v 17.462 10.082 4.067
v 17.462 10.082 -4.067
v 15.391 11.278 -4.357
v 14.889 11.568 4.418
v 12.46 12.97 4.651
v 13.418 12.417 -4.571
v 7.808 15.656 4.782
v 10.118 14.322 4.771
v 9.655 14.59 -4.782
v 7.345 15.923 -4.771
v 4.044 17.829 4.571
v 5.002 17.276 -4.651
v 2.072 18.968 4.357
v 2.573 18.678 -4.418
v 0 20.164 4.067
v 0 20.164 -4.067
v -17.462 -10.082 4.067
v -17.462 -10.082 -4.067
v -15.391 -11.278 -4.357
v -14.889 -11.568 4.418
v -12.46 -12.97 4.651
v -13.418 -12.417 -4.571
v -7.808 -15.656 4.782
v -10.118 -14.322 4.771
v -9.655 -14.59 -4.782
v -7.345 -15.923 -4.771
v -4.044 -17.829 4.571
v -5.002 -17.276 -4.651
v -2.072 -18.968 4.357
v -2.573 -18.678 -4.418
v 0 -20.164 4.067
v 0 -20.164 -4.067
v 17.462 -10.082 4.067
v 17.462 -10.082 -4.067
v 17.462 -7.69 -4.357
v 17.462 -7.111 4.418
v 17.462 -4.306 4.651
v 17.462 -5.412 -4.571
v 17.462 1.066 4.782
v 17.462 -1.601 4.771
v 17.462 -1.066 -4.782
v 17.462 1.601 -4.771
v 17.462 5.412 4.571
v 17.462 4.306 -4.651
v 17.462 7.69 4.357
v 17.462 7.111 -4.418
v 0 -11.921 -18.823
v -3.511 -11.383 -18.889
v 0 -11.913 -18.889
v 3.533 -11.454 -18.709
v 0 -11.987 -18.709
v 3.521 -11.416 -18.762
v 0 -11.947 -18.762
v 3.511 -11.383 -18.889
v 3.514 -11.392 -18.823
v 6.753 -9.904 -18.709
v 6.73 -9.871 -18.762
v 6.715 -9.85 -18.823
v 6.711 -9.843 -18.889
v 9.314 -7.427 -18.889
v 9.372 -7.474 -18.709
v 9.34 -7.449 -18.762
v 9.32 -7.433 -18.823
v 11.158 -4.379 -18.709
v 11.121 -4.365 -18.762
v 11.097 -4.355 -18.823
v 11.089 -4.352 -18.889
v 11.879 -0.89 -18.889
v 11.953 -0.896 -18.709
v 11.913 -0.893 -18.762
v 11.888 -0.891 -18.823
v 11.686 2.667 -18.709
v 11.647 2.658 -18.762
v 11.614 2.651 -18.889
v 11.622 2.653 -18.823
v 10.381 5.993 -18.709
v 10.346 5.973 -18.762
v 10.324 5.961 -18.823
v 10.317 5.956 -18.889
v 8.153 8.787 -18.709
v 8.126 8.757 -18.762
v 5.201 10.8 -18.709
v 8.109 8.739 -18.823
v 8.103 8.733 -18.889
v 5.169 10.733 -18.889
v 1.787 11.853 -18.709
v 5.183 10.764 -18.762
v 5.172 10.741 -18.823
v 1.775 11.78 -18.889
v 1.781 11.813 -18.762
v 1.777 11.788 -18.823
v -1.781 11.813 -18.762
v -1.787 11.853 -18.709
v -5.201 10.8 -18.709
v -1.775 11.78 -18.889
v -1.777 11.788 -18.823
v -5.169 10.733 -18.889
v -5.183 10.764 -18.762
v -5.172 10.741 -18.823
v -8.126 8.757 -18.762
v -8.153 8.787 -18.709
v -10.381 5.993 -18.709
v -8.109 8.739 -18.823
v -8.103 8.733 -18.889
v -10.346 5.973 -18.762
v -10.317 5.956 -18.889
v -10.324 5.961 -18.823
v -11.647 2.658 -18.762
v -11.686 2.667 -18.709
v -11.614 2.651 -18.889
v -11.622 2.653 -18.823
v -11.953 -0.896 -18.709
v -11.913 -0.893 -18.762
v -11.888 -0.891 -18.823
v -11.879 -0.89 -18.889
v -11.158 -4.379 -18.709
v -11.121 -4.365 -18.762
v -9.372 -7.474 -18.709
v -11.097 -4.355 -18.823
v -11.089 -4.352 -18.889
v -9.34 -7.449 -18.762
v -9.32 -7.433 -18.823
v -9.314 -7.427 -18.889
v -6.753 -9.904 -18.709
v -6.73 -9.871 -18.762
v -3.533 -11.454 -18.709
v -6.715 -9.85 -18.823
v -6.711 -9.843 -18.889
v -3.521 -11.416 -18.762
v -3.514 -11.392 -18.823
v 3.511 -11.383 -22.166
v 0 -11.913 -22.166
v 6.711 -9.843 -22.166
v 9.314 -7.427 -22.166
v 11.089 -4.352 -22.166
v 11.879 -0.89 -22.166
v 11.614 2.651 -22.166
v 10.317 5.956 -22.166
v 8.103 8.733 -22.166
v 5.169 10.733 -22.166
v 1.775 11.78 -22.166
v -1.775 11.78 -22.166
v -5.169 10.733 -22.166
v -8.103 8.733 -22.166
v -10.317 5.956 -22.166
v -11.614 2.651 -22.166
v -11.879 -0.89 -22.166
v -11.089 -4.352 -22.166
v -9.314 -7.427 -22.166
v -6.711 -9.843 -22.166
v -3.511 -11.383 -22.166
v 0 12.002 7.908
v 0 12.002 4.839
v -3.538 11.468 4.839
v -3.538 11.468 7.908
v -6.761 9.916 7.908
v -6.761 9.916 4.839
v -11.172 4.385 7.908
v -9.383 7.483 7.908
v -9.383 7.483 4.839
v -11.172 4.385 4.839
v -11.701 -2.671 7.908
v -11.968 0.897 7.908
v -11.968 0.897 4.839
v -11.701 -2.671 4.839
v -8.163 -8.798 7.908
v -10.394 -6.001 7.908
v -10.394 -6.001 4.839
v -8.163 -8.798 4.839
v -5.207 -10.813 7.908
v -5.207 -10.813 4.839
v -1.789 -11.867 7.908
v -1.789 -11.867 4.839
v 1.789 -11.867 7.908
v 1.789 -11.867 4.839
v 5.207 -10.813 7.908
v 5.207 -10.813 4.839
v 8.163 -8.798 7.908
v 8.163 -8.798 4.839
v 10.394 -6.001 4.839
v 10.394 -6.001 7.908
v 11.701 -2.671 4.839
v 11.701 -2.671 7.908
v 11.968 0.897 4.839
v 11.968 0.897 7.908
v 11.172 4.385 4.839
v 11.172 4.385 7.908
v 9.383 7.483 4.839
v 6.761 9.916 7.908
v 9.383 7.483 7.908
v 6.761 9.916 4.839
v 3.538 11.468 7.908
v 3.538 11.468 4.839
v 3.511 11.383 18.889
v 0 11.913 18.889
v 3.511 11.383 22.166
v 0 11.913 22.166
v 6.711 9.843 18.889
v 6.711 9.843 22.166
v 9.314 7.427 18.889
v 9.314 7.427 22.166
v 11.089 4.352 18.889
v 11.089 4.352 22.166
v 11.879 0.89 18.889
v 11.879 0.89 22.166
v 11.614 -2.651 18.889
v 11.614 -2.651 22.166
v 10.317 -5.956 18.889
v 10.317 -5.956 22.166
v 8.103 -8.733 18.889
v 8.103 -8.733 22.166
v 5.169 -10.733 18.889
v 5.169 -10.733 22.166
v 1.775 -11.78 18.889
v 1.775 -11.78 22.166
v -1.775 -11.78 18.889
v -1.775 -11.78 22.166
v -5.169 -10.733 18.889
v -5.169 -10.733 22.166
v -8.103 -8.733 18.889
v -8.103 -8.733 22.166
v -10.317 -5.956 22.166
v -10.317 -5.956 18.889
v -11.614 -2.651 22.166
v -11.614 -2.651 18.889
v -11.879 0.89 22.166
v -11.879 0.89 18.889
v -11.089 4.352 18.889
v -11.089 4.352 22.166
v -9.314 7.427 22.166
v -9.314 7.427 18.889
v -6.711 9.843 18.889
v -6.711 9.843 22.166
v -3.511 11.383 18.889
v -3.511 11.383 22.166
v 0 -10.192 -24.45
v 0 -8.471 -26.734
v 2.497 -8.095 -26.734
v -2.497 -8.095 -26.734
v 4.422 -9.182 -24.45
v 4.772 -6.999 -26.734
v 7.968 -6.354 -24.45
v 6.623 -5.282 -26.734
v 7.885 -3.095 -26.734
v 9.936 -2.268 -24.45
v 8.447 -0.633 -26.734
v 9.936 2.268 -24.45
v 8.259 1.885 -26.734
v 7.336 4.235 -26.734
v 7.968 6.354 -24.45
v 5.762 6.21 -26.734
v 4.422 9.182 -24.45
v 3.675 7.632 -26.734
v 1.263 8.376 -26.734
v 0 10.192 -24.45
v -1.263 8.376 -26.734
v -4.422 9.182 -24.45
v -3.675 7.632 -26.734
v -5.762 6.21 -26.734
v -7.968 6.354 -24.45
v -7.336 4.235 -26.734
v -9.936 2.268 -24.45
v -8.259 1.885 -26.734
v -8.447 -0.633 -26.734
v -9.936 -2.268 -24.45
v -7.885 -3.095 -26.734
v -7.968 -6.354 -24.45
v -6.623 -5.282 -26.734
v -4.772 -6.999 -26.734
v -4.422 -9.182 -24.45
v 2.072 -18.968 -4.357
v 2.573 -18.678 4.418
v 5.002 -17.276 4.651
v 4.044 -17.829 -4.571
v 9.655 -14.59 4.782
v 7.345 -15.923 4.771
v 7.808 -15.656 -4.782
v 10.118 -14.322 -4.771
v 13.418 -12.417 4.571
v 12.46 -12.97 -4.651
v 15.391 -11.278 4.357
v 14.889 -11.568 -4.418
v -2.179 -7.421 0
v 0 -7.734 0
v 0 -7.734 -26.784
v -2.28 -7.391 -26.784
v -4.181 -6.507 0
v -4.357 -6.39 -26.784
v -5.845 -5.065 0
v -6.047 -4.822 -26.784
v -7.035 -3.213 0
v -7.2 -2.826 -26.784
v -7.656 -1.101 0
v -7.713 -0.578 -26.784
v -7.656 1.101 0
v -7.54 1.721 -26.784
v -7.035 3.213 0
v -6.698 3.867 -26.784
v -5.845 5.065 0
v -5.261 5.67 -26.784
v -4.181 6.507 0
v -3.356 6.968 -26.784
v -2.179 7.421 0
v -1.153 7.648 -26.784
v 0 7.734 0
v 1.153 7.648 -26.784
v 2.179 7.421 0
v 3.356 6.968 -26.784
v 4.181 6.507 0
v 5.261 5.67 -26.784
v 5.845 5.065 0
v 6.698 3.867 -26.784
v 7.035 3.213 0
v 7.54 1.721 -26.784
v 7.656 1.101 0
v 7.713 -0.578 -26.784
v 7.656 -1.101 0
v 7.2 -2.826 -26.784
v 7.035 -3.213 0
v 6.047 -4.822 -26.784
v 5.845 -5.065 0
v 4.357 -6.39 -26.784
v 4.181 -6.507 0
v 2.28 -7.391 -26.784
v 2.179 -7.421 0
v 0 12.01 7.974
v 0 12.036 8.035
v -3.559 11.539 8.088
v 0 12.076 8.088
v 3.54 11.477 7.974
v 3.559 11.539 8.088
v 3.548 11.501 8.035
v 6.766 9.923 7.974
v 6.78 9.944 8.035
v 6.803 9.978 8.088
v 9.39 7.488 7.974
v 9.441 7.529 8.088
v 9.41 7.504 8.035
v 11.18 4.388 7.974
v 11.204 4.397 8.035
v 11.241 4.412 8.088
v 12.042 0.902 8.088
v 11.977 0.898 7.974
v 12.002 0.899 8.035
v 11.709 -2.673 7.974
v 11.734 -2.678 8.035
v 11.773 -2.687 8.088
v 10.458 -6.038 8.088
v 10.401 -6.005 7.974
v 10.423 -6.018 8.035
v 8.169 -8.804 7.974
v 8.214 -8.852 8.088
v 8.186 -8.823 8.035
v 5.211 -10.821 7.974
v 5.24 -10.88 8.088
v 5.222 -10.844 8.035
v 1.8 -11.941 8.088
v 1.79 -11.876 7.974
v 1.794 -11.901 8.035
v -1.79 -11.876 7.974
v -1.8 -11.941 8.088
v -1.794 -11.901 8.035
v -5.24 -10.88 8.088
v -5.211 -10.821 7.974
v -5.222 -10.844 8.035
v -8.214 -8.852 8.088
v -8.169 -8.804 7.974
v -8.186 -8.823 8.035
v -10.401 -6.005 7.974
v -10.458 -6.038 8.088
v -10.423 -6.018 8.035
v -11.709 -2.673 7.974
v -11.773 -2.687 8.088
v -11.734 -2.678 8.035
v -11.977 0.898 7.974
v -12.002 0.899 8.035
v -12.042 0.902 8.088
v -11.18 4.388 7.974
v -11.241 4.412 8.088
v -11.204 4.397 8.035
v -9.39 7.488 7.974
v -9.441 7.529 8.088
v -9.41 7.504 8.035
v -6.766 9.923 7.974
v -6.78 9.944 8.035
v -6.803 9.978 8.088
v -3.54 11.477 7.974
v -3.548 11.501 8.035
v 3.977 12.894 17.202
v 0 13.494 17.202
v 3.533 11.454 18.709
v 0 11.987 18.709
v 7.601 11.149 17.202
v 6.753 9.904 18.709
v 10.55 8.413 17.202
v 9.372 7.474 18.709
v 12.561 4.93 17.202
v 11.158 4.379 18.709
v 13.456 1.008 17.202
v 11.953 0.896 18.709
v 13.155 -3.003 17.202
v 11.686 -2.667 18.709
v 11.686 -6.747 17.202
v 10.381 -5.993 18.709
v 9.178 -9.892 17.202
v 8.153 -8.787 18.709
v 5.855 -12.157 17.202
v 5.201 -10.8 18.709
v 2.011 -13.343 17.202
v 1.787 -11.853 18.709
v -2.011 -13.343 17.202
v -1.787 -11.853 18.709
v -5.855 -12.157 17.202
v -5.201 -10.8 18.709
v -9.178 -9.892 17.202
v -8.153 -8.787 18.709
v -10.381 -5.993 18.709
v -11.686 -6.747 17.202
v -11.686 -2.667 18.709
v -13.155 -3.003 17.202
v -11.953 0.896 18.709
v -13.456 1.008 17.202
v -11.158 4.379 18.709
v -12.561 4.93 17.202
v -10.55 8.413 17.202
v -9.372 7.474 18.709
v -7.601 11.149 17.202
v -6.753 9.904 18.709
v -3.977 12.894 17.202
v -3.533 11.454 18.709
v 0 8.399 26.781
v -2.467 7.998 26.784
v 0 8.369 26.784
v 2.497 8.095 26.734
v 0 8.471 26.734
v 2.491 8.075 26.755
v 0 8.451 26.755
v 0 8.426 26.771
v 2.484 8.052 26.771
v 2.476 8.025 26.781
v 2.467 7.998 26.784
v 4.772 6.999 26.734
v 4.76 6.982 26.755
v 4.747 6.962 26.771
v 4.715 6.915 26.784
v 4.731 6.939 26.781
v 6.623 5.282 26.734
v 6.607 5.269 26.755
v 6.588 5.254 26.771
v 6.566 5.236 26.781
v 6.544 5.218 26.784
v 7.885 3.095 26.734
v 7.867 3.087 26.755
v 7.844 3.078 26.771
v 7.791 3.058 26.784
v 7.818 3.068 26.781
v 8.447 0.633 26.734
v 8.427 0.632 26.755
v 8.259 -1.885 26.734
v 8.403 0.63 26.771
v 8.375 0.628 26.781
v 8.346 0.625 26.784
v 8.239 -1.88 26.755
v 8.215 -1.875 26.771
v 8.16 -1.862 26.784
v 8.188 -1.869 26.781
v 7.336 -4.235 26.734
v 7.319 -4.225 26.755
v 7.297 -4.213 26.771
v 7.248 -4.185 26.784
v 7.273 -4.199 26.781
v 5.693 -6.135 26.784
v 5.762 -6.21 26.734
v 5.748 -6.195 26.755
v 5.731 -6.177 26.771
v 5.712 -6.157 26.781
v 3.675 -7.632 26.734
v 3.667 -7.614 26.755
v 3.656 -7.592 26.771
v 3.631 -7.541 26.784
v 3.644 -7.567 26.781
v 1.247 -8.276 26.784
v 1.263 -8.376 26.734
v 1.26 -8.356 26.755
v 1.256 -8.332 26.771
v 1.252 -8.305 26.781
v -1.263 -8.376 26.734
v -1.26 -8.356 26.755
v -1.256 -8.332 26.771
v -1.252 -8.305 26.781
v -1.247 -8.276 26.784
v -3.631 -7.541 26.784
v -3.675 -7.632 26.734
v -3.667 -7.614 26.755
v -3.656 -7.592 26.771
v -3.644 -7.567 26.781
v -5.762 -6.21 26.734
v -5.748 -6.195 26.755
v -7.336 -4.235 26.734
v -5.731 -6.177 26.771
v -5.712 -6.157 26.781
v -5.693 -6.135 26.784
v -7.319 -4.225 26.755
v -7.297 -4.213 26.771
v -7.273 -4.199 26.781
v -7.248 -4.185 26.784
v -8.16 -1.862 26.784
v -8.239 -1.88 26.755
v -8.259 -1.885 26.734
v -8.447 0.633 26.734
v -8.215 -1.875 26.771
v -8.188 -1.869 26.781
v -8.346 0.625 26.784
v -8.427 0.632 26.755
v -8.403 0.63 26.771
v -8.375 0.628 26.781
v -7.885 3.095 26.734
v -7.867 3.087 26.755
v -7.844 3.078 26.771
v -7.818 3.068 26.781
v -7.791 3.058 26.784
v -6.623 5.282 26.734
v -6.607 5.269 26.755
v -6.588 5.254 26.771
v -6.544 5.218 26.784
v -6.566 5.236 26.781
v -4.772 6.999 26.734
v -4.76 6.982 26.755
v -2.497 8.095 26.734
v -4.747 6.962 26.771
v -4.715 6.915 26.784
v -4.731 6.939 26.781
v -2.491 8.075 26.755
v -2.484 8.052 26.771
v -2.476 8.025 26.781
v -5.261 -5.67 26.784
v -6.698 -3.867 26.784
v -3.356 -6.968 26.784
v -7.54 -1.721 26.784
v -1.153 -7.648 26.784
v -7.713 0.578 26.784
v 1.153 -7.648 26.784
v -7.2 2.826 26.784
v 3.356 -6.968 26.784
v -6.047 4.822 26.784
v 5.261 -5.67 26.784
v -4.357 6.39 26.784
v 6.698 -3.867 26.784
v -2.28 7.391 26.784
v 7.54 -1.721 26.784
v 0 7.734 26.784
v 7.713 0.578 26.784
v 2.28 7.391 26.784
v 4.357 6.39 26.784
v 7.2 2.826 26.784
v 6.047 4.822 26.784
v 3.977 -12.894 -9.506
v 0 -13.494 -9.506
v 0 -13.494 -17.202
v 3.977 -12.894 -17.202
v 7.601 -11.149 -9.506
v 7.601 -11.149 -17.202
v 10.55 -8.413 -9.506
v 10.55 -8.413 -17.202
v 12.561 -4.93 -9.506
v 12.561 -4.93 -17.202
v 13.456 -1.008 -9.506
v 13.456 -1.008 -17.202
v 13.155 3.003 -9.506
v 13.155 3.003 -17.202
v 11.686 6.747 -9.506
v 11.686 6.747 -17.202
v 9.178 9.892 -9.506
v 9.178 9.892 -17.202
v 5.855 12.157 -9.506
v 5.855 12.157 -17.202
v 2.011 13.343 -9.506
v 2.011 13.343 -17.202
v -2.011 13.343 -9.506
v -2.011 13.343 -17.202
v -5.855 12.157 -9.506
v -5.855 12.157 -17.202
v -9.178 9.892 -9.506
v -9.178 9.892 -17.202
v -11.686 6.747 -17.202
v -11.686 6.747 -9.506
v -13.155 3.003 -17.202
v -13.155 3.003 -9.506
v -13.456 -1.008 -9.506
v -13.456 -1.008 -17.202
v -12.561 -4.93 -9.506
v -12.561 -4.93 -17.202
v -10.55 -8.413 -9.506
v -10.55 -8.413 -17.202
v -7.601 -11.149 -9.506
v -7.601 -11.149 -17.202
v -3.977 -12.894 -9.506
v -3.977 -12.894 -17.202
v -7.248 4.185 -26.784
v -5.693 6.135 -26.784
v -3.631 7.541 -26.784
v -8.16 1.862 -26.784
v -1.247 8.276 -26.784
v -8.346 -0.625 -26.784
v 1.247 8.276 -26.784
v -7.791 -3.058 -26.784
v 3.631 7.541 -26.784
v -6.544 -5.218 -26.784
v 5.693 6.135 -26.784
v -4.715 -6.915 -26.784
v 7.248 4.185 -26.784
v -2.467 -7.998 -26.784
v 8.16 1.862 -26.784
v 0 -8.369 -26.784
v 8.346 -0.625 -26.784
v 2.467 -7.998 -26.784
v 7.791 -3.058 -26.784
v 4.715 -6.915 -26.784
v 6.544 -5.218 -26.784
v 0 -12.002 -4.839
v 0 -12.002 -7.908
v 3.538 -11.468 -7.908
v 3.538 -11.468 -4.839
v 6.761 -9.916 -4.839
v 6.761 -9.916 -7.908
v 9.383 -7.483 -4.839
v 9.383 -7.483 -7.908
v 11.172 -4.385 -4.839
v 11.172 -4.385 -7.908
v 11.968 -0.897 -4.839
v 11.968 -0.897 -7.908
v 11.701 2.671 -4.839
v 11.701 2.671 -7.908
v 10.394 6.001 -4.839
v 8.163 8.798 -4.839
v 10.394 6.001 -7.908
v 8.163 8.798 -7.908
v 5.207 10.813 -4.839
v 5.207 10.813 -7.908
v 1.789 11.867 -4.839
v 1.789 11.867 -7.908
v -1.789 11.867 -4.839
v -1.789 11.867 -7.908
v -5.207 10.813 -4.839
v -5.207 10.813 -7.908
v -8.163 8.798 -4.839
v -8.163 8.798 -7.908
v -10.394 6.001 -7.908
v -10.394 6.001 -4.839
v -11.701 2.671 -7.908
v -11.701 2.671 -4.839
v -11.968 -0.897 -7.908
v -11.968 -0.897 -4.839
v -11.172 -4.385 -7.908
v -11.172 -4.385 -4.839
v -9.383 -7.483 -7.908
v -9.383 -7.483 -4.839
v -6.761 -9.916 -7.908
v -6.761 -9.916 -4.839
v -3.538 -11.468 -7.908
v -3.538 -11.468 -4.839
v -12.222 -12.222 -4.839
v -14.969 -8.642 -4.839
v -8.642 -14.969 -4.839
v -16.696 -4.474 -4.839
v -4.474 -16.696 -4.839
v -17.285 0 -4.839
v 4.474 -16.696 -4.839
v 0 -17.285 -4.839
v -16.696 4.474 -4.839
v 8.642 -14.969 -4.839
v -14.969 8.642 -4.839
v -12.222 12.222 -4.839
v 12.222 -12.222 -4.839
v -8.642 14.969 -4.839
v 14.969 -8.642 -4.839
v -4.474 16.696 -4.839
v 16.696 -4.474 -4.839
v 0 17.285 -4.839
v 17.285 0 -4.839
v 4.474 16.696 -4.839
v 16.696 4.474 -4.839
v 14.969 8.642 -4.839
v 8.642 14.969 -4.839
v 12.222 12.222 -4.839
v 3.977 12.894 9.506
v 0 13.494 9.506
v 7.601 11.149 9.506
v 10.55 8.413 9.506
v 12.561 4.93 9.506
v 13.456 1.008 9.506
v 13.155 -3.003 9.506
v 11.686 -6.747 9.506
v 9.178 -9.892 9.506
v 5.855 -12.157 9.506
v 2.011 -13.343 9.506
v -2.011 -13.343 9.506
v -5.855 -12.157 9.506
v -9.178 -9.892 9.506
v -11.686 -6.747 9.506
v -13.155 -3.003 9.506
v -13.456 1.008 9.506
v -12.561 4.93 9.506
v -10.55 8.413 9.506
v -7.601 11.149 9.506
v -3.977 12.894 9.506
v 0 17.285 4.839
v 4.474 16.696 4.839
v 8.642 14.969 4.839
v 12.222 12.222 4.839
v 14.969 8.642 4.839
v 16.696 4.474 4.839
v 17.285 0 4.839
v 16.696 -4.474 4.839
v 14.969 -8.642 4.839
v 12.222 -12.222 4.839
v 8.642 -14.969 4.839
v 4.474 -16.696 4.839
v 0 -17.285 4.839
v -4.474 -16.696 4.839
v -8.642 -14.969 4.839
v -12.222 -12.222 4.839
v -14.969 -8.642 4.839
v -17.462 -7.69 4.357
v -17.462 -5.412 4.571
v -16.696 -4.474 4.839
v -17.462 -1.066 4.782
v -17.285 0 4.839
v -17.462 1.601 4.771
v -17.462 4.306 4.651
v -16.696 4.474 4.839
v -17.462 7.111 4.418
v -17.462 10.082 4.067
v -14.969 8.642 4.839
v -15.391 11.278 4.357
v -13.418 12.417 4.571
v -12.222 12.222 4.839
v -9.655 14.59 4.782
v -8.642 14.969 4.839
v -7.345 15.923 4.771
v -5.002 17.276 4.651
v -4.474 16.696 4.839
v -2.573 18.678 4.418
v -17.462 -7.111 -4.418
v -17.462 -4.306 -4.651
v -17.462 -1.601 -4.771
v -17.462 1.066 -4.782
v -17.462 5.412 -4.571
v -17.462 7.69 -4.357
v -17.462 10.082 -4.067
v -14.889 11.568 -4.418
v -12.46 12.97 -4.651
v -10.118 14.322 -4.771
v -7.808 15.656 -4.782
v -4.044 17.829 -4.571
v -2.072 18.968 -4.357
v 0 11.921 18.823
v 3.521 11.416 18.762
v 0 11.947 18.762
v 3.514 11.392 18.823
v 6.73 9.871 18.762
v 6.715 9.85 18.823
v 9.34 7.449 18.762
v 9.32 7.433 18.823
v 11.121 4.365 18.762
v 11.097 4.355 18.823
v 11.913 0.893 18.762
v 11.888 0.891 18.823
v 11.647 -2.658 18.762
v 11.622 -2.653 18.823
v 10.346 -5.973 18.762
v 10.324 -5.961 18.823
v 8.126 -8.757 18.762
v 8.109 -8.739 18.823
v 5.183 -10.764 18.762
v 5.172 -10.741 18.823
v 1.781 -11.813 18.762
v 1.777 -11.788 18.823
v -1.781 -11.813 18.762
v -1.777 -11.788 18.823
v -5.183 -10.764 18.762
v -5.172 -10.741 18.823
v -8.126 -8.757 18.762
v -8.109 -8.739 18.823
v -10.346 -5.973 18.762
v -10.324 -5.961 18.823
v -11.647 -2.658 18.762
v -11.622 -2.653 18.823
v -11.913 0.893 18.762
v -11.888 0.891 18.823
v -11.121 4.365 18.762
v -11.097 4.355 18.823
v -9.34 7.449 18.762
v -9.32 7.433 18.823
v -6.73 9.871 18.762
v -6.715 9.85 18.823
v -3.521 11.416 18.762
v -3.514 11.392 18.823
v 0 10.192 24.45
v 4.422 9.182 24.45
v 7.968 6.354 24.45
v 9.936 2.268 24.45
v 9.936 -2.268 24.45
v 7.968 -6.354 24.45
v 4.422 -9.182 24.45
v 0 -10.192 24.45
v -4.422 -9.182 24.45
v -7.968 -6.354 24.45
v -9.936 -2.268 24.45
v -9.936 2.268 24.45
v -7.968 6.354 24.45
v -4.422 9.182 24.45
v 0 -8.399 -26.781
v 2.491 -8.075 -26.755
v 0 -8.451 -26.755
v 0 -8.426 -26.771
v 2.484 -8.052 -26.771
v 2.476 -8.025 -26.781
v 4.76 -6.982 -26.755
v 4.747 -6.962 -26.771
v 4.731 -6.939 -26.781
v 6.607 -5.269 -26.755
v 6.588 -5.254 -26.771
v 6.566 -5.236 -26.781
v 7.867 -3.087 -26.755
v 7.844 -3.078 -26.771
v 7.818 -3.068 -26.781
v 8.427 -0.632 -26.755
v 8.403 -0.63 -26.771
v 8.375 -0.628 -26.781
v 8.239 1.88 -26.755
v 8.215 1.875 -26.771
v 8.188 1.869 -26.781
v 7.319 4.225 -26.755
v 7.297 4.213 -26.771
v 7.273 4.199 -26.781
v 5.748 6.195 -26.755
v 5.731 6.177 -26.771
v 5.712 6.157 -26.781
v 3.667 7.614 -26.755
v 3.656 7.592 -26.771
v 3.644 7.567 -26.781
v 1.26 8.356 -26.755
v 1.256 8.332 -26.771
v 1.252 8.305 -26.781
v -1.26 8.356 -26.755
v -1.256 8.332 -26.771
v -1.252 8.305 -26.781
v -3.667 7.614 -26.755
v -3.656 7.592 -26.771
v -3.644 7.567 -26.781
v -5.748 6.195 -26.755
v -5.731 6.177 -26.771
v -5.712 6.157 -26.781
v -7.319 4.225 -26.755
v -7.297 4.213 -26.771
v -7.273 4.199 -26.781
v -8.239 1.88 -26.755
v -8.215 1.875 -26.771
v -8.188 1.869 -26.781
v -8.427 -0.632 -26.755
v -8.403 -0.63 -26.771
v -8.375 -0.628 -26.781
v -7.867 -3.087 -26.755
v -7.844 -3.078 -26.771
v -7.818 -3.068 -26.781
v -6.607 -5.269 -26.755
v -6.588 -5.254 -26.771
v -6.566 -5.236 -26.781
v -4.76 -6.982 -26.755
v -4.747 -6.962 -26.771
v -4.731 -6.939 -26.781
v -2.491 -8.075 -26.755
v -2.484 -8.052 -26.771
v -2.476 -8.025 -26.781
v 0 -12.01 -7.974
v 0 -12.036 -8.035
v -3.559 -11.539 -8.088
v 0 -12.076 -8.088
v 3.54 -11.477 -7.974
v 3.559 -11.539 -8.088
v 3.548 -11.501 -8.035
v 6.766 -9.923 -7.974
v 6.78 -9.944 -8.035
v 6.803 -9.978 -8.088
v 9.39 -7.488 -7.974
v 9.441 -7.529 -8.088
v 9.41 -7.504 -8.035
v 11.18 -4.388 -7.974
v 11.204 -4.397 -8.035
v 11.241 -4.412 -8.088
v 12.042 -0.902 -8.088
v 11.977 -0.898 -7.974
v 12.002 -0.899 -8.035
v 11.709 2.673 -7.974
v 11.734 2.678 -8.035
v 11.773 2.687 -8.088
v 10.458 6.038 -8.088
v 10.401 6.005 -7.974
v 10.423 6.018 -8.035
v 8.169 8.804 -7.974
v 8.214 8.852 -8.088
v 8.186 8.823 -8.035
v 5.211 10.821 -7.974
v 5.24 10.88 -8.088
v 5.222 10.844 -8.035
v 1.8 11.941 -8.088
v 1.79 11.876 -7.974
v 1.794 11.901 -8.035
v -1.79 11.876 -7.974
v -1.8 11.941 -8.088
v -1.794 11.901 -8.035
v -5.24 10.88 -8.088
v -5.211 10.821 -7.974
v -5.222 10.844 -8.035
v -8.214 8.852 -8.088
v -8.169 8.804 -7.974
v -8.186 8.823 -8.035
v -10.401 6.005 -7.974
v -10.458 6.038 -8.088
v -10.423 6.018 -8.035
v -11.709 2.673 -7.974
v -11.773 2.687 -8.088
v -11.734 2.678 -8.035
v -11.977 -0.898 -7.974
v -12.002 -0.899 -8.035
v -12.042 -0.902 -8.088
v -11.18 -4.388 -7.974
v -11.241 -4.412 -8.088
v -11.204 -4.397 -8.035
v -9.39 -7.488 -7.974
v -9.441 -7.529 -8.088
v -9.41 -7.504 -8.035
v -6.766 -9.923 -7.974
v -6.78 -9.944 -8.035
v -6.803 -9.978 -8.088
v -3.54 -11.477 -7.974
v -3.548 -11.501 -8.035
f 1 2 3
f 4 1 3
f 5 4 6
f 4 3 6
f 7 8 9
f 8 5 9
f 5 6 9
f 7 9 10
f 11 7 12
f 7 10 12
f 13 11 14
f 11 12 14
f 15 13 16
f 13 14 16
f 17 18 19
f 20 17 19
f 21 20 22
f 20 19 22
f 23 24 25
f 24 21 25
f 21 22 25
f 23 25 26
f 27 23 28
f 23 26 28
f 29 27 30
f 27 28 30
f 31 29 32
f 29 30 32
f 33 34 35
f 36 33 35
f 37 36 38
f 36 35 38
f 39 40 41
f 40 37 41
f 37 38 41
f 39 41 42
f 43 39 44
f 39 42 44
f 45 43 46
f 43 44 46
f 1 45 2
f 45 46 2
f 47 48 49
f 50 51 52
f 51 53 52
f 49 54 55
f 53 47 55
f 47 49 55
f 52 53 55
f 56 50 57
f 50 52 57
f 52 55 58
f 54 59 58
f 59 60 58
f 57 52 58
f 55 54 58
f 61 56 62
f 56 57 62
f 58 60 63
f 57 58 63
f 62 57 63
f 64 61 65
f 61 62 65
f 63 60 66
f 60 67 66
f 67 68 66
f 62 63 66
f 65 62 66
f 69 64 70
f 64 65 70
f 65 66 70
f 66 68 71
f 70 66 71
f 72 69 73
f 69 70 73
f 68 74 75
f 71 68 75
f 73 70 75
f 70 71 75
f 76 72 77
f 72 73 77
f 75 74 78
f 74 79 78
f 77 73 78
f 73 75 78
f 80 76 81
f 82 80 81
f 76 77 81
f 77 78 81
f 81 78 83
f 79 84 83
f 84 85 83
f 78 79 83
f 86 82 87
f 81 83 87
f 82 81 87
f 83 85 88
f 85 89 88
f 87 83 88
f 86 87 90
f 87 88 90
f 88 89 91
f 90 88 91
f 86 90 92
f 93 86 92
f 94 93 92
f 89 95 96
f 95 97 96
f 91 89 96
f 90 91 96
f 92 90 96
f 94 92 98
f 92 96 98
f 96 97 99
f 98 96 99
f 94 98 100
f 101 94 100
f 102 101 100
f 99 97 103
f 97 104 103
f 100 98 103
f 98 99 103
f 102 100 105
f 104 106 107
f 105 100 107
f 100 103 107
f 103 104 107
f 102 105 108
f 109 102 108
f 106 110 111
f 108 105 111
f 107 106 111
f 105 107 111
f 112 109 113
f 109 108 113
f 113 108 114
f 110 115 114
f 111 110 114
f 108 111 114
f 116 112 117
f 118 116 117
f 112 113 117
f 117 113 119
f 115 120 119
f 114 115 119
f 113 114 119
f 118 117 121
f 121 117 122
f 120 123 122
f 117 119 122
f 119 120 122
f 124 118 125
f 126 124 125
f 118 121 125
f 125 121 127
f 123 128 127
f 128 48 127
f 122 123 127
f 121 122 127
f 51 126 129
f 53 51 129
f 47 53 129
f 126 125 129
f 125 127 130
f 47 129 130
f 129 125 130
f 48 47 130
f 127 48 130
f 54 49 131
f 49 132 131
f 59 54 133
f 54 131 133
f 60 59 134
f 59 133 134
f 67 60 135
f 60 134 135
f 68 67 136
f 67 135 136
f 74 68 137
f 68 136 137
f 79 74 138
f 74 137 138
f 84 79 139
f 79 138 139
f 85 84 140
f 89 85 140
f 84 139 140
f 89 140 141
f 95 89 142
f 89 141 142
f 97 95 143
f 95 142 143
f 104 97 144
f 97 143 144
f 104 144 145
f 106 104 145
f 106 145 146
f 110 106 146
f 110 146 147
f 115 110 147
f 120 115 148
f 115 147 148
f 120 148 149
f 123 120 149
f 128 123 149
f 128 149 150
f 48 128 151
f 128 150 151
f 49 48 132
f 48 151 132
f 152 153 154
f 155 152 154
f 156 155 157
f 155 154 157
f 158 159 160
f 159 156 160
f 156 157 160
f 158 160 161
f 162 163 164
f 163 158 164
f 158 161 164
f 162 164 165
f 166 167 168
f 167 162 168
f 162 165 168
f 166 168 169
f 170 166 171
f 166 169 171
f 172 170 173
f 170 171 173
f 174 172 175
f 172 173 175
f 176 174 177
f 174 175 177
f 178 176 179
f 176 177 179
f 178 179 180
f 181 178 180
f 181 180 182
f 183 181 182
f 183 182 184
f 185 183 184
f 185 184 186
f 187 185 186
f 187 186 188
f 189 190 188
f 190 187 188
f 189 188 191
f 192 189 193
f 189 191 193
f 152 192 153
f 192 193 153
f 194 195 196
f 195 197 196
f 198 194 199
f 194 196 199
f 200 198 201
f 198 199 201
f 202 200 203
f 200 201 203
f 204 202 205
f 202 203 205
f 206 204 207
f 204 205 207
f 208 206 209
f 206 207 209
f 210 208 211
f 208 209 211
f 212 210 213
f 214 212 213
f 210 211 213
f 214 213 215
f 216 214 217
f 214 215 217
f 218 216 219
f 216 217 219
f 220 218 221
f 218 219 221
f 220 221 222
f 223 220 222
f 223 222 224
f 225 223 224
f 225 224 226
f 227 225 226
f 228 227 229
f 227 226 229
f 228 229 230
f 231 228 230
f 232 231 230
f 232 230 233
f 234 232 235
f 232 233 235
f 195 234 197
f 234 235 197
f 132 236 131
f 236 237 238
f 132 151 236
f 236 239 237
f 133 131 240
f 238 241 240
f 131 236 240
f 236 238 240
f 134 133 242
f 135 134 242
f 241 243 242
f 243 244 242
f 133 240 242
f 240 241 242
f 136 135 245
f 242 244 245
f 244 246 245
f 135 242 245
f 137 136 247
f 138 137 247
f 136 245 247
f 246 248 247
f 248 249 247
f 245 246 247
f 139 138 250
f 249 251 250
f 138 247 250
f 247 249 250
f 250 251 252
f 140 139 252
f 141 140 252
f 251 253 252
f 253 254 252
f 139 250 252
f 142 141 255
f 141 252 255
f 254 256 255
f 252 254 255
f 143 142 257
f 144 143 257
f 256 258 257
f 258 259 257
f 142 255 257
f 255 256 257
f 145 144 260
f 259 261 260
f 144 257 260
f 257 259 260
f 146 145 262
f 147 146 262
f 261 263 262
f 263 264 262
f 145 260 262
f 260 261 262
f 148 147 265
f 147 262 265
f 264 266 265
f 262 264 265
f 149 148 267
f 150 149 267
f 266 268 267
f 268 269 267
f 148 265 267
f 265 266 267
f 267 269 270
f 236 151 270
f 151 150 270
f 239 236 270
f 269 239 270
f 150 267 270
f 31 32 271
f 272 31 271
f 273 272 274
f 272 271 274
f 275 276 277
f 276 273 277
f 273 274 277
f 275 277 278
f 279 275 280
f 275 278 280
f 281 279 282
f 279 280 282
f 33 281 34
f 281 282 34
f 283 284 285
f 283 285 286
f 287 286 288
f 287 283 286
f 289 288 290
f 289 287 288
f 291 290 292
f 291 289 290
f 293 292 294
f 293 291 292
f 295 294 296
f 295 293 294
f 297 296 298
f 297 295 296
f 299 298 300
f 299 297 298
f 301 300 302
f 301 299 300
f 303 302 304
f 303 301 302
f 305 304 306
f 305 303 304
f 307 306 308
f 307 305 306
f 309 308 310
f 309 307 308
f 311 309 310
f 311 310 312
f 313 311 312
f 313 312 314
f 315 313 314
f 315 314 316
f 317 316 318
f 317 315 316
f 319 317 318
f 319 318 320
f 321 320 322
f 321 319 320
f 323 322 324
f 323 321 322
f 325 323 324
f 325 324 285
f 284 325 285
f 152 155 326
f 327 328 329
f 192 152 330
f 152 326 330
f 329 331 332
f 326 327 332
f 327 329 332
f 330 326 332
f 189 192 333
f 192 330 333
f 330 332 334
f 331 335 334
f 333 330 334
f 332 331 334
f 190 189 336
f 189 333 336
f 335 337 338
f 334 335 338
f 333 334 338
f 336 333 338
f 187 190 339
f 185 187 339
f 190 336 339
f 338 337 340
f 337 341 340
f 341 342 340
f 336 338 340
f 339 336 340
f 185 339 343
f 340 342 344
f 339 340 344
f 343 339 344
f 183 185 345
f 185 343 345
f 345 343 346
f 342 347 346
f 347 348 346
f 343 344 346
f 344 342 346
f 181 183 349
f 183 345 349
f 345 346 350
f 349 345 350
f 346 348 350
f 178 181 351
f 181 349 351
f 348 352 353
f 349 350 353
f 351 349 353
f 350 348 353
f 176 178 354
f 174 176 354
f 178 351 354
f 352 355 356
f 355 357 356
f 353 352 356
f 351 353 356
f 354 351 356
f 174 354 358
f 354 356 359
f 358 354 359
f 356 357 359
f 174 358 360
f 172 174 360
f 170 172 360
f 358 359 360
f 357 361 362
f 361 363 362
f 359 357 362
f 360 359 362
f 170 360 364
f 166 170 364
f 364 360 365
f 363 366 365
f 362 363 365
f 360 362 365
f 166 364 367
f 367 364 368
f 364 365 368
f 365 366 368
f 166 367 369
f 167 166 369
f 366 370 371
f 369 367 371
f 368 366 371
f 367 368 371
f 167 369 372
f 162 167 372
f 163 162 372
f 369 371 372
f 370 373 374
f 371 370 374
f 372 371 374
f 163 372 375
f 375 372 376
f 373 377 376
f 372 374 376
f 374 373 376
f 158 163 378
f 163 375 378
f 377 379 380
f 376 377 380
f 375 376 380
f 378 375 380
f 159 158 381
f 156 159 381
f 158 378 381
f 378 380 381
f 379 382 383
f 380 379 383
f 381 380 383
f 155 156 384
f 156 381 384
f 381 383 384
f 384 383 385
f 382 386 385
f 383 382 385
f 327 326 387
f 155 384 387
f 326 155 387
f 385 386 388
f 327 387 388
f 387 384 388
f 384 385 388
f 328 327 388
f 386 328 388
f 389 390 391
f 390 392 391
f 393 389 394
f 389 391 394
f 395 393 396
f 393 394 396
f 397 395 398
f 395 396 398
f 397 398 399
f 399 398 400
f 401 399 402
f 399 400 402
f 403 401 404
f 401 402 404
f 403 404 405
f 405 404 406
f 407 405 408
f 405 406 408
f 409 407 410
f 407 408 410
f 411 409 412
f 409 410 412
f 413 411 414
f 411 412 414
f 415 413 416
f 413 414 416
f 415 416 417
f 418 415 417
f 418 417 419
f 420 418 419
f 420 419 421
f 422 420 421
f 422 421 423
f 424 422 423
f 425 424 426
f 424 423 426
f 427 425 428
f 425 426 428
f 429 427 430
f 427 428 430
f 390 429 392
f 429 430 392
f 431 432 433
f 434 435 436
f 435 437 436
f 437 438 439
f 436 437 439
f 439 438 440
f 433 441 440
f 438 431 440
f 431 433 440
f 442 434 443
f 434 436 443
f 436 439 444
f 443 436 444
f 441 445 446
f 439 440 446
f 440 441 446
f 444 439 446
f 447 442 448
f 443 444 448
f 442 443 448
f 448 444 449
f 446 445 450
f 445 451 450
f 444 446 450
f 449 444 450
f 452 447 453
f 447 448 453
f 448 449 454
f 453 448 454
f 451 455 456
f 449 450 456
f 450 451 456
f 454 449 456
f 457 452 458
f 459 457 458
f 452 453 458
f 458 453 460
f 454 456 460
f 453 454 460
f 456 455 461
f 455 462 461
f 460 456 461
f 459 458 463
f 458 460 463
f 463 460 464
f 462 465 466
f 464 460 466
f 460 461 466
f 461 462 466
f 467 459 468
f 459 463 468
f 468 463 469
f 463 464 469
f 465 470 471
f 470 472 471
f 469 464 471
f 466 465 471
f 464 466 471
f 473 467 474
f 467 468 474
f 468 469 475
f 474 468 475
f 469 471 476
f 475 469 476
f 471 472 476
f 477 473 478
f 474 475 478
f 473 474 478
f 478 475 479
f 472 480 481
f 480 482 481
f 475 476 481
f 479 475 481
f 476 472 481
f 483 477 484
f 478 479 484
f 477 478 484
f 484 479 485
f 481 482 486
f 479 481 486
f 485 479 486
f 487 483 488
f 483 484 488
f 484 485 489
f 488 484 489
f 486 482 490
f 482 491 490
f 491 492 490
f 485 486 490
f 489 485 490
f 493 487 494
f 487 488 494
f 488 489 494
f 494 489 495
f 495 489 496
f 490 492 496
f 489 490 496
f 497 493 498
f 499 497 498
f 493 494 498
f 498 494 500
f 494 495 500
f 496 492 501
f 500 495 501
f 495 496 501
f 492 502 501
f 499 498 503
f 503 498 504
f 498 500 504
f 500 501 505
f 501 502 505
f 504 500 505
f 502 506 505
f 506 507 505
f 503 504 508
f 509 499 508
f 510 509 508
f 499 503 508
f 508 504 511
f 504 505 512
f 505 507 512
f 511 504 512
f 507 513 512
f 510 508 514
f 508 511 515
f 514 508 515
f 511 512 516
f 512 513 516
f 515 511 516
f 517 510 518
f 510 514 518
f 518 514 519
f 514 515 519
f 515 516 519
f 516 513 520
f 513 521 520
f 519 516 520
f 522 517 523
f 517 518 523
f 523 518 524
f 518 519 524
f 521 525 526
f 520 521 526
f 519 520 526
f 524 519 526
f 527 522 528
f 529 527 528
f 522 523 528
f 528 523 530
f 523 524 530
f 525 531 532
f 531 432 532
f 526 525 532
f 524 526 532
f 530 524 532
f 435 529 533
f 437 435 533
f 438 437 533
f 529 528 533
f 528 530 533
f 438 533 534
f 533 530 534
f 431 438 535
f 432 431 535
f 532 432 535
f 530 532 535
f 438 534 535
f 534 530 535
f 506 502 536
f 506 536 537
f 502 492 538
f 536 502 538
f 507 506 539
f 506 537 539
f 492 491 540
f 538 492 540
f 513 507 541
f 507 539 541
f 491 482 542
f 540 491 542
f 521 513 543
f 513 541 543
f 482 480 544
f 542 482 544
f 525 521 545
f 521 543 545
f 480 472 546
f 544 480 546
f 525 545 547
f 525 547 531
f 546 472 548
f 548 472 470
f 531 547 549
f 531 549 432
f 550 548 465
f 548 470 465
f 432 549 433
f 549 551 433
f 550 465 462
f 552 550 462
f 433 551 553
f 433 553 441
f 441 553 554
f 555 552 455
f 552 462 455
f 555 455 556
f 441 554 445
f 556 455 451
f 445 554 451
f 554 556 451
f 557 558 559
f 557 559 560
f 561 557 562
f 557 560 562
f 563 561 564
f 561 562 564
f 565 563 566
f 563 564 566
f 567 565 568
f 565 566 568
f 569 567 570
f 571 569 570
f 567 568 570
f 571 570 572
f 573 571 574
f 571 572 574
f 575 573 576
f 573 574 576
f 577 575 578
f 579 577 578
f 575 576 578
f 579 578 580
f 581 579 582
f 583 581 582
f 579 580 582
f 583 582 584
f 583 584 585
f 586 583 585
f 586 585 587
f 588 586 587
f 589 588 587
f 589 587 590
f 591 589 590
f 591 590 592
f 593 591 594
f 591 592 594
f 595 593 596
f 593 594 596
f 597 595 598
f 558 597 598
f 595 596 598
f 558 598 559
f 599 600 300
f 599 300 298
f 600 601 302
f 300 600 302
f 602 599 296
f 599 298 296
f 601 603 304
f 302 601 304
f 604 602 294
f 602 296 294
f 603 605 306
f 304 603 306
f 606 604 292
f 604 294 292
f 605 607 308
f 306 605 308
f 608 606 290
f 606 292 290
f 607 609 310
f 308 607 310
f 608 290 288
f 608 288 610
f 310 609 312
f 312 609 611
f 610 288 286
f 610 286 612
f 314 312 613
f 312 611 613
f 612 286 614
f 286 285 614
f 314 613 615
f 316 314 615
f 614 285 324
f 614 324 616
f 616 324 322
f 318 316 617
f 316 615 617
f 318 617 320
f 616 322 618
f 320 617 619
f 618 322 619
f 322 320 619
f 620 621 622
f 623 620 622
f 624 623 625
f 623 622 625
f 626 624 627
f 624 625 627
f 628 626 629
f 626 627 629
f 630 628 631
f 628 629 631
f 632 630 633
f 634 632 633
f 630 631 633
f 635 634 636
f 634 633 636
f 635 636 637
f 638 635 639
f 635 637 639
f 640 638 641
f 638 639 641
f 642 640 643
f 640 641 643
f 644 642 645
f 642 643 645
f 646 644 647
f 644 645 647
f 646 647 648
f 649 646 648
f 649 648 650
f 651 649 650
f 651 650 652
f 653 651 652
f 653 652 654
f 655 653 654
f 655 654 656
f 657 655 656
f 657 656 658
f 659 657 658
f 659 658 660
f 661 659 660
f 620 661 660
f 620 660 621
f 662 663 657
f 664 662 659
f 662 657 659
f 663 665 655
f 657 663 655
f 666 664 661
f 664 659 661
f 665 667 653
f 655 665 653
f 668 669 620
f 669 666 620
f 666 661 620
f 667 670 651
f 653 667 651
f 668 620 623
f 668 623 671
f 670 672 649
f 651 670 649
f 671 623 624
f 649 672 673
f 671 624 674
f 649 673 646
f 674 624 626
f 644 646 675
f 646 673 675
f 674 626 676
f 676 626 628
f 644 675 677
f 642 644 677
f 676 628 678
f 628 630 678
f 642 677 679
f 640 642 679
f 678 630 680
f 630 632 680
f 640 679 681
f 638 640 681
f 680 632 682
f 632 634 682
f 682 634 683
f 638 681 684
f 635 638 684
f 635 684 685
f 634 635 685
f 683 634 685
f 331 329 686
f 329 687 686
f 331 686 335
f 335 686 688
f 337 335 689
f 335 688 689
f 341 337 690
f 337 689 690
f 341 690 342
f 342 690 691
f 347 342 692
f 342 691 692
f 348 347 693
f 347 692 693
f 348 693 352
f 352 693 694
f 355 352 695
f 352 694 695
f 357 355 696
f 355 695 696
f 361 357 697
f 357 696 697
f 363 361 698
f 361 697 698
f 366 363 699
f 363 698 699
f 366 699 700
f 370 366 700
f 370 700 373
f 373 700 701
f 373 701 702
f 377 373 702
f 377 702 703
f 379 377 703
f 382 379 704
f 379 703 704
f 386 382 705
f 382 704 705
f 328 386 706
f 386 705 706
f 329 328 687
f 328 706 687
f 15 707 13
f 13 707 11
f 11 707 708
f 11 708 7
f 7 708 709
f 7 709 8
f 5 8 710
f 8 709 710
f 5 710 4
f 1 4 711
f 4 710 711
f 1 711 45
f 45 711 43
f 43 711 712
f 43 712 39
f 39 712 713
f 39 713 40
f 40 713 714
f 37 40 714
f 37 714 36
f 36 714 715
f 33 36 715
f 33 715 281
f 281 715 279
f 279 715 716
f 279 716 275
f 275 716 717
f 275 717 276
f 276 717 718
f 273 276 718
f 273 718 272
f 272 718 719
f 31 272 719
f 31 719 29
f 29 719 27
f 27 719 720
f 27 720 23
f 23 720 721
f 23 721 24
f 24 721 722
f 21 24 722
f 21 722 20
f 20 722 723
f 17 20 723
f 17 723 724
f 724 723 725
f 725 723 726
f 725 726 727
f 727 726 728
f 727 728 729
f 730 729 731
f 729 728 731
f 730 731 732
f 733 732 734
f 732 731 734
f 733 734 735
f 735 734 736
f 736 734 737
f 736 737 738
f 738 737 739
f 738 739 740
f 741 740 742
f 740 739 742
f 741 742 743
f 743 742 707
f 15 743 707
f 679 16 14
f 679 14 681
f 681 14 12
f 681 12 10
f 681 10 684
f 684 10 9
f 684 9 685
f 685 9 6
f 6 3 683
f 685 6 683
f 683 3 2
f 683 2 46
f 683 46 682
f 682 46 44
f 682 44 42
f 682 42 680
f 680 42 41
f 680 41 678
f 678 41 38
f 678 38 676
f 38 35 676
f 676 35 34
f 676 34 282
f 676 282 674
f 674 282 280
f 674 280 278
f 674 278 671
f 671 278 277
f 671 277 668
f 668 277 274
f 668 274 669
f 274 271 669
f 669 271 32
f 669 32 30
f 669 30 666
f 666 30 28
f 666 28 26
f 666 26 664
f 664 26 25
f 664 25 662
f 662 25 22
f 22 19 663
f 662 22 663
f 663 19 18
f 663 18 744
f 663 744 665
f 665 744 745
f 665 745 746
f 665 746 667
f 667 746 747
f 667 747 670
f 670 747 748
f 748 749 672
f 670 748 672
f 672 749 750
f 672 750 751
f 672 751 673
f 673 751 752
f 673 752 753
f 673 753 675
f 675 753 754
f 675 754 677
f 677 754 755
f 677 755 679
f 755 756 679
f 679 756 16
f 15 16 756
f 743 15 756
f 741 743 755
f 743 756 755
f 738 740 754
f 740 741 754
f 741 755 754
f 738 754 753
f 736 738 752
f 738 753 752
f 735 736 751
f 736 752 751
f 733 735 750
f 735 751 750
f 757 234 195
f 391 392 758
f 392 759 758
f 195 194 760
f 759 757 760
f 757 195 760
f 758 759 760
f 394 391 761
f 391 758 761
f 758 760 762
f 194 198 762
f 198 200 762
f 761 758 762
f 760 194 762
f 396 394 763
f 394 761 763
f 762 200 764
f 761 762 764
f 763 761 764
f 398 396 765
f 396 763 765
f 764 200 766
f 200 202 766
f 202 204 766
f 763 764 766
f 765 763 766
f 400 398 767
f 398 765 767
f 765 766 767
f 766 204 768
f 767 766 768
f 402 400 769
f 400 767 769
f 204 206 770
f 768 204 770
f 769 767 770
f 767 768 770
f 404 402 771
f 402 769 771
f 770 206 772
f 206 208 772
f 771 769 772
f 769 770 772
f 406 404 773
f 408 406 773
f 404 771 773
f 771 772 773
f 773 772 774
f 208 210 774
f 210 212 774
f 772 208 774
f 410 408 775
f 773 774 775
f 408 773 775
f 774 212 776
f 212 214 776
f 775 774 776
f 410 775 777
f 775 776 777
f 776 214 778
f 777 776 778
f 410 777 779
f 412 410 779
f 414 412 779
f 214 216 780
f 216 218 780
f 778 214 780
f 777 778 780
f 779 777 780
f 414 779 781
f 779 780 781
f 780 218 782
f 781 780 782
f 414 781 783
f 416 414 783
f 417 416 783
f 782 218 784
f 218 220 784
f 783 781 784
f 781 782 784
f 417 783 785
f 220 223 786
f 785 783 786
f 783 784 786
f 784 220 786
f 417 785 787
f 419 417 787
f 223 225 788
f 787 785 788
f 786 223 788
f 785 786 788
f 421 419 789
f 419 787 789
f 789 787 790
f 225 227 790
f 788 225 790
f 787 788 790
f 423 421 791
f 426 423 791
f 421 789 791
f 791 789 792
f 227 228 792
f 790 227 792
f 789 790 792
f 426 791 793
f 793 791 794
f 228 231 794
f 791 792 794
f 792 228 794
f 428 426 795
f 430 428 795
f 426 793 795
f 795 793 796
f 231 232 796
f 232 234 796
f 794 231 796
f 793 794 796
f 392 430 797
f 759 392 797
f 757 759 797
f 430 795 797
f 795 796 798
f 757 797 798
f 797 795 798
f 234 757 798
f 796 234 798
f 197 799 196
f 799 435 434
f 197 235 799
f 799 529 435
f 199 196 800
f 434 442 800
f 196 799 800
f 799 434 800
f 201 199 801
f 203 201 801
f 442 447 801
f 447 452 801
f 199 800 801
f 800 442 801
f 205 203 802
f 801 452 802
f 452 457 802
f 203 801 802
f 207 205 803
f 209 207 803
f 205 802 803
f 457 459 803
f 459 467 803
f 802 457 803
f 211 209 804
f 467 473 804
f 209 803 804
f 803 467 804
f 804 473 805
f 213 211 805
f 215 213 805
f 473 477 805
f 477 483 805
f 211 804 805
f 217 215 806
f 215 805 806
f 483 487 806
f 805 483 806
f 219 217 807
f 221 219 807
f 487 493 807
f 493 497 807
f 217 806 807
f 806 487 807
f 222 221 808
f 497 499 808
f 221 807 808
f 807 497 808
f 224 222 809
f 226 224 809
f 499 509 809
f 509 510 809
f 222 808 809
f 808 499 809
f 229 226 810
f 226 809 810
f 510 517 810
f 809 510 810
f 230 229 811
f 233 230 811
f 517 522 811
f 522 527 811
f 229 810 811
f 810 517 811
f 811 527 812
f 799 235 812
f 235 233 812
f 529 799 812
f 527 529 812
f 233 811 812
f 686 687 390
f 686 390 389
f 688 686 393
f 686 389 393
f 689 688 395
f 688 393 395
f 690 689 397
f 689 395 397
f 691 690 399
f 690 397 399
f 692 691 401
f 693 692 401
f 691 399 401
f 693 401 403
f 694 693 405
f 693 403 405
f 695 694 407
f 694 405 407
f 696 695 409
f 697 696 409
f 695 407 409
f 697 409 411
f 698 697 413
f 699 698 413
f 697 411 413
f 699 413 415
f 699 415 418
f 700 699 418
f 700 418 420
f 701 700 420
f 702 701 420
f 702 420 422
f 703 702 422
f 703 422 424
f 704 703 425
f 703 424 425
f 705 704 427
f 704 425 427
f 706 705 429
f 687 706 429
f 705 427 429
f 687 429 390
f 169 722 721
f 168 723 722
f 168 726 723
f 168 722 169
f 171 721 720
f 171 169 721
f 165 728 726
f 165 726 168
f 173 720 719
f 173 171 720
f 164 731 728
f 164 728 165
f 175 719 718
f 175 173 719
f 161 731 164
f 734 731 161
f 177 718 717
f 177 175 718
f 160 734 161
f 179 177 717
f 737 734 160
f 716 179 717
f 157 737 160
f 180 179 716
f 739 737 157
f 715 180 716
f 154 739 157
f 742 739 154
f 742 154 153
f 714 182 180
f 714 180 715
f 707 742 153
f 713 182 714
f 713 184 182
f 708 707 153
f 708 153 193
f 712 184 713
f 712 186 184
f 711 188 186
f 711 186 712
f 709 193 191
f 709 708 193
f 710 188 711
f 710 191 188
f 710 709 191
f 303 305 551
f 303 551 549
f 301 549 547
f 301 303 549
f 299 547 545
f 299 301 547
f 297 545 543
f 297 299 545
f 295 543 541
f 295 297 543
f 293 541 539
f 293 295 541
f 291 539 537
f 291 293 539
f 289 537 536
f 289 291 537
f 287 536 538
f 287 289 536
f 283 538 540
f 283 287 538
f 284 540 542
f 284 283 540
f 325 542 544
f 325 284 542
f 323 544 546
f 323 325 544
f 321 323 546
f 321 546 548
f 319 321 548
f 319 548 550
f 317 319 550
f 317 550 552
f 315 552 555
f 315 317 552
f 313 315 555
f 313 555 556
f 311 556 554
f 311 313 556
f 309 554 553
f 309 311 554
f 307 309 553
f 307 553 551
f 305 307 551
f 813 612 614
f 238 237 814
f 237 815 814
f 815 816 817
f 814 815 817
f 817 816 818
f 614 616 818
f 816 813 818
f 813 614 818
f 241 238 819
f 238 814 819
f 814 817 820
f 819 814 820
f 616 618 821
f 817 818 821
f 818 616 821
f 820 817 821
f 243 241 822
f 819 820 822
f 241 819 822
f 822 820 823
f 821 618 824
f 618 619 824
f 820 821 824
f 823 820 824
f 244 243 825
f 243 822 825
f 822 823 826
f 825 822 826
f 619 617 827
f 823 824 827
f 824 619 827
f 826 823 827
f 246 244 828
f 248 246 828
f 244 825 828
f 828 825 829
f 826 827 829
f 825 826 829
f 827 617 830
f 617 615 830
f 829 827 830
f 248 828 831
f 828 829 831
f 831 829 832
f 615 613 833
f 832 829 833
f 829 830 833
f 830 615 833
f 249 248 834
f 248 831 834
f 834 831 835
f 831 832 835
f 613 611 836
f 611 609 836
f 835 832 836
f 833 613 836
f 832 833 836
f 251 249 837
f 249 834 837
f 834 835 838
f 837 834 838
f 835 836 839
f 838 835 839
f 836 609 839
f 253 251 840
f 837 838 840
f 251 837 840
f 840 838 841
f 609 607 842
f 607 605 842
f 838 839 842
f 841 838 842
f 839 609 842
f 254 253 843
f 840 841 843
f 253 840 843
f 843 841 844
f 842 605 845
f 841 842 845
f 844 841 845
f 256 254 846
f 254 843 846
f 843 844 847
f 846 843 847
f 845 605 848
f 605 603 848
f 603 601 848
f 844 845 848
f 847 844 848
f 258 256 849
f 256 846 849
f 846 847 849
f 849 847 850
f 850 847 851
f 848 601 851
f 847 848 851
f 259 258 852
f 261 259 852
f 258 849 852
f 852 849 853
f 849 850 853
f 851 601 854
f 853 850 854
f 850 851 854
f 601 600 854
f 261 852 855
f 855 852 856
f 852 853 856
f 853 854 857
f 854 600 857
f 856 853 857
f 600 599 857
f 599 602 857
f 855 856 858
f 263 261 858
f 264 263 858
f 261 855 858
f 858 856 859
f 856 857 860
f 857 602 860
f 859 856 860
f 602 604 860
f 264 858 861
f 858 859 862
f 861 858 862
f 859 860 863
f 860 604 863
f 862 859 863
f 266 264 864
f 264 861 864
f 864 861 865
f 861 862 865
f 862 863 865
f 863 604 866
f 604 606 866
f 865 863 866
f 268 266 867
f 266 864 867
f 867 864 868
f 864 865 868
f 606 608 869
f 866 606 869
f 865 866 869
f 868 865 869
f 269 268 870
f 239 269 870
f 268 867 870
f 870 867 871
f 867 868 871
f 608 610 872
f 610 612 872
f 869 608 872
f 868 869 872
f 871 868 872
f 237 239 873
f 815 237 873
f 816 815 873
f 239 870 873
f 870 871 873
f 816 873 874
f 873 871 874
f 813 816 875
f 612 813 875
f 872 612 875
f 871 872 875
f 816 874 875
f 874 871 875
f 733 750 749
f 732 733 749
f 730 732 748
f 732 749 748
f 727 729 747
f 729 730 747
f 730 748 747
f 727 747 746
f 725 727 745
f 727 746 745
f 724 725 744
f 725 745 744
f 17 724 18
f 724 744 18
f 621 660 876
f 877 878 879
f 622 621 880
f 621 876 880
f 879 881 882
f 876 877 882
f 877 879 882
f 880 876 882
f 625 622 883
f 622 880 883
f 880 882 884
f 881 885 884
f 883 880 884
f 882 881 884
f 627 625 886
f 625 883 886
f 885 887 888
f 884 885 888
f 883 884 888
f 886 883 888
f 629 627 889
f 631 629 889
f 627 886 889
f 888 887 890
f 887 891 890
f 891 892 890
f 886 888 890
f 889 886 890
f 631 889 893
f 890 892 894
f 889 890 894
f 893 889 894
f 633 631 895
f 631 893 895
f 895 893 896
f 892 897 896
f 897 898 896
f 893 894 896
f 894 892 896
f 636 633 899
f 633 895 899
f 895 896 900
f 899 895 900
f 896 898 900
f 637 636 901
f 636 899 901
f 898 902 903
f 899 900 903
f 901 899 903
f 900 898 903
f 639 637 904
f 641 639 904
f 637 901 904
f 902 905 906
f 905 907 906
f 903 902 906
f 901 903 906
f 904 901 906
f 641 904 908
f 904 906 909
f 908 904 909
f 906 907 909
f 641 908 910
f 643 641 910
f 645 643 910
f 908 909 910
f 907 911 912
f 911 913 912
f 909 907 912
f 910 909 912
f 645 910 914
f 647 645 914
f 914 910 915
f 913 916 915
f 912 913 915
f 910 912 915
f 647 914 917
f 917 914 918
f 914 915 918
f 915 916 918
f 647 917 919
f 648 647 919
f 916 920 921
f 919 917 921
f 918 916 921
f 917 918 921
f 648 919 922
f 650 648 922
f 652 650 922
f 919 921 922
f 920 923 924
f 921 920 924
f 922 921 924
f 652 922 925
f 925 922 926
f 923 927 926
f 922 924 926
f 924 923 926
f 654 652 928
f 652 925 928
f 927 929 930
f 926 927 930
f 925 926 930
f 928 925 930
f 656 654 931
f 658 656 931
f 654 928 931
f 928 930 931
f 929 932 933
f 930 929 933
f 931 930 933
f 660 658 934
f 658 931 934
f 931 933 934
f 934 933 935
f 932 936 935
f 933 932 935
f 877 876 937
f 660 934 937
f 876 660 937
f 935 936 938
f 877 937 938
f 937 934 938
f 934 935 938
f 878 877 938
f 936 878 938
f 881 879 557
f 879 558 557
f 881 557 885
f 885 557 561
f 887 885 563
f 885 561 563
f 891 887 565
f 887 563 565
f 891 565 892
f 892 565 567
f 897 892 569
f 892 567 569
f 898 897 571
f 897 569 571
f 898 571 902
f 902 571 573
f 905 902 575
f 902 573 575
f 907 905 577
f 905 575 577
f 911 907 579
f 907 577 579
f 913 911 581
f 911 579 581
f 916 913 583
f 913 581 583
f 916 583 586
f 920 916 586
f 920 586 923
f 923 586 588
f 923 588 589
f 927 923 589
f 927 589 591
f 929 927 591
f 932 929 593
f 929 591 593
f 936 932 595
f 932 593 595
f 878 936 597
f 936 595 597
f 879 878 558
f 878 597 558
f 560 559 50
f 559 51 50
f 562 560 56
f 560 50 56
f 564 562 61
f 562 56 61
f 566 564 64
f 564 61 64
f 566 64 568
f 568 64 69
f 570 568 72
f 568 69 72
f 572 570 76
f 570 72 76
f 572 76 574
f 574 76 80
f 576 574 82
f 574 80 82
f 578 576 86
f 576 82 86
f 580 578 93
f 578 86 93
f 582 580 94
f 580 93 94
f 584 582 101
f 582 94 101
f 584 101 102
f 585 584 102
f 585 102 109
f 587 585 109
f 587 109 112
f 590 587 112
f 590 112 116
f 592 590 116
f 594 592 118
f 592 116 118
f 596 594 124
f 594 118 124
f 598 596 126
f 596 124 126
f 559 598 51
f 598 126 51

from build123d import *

# Parameters (mm, degrees)
CIRPATTERN1_COUNT   = 2
CIRPATTERN1_ANGLE   = 180
BOSS_EXTRUDE1_START = -4.8387
BOSS_EXTRUDE1_DEPTH = 9.6774
CIRPATTERN2_COUNT   = 2


with BuildPart() as part:
    # Sketch1 → Revolve1 (revolve)
    with BuildSketch(Plane(origin=(0, 0, 0), x_dir=(0, 0, -1), z_dir=(1, 0, 0))):
        with BuildLine():
            Line((-26.7843, 0), (0, 0))
            Line((0, 0), (0, 12.0015))
            Line((0, 12.0015), (-7.908489755, 12.0015))
            ThreePointArc((-7.908489755, 12.0015), (-8.005691347, 12.020834599), (-8.088094878, 12.075894878))
            Line((-8.088094878, 12.075894878), (-9.50595, 13.49375))
            Line((-9.50595, 13.49375), (-17.20215, 13.49375))
            Line((-17.20215, 13.49375), (-18.708905122, 11.986994878))
            ThreePointArc((-18.708905122, 11.986994878), (-18.791308653, 11.931934599), (-18.888510245, 11.9126))
            Line((-18.888510245, 11.9126), (-22.16644943, 11.9126))
            Line((-22.16644943, 11.9126), (-26.733730508, 8.470906846))
            ThreePointArc((-26.733730508, 8.470906846), (-26.770956664, 8.426147258), (-26.7843, 8.369480136))
            Line((-26.7843, 8.369480136), (-26.7843, 0))
        make_face()
    revolve(axis=Axis((0, 0, 19.812), (0, 0, -1)))


with BuildPart() as cirpattern1_1:
    # CirPattern1: pattern copy
    add(part.part.rotate(Axis((-10.4775, 0, 0), (1, 0, 0)), 1 * CIRPATTERN1_ANGLE / (CIRPATTERN1_COUNT - 1)))


with BuildPart() as part_1:
    add(part.part)

    add(cirpattern1_1.part)  # Boss-Extrude1 merges CirPattern1_1
    # Sketch4 → Boss-Extrude1 (add)
    with BuildSketch(Plane.XY.offset(BOSS_EXTRUDE1_START)):
        Polygon((0, 20.163958151), (-17.4625, 10.081979076), (-17.4625, -10.081979076), (0, -20.163958151), (17.4625, -10.081979076), (17.4625, 10.081979076), align=None)
    extrude(amount=BOSS_EXTRUDE1_DEPTH)

    # Sketch5 → Cut-Revolve1 (revolve, cut)
    with BuildSketch(Plane(origin=(0, 0, 0), x_dir=(0, 0, -1), z_dir=(1, 0, 0))):
        Polygon((-4.8387, 23.043216303), (4.8387, 23.043216303), (4.8387, 17.2847), (4.067205104, 20.163958151), (-4.067205104, 20.163958151), (-4.8387, 17.2847), align=None)
    revolve(axis=Axis((0, 0, 4.8387), (0, 0, -1)), mode=Mode.SUBTRACT)

    # Sketch6 → Cut-Revolve2 (revolve, cut)
    with BuildSketch(Plane(origin=(0, 0, 0), x_dir=(0, 0, -1), z_dir=(1, 0, 0))):
        with BuildLine():
            Line((-26.7843, 7.7343), (0, 7.7343))
            ThreePointArc((0, 7.7343), (5.468975978, 5.468975978), (7.7343, 0))
            Line((7.7343, 0), (-26.7843, 0))
            Line((-26.7843, 0), (-26.7843, 7.7343))
        make_face()
    cut_revolve2 = revolve(axis=Axis((0, 0, -7.7343), (0, 0, 1)), mode=Mode.SUBTRACT)

    # CirPattern2: Cut-Revolve2 ×2 about axis
    cirpattern2_axis = Axis((-10.4775, 0, 0), (1, 0, 0))
    for i in range(1, CIRPATTERN2_COUNT):
        add(cut_revolve2.rotate(cirpattern2_axis, i * 360 / CIRPATTERN2_COUNT), mode=Mode.SUBTRACT)


solid = part_1.part
